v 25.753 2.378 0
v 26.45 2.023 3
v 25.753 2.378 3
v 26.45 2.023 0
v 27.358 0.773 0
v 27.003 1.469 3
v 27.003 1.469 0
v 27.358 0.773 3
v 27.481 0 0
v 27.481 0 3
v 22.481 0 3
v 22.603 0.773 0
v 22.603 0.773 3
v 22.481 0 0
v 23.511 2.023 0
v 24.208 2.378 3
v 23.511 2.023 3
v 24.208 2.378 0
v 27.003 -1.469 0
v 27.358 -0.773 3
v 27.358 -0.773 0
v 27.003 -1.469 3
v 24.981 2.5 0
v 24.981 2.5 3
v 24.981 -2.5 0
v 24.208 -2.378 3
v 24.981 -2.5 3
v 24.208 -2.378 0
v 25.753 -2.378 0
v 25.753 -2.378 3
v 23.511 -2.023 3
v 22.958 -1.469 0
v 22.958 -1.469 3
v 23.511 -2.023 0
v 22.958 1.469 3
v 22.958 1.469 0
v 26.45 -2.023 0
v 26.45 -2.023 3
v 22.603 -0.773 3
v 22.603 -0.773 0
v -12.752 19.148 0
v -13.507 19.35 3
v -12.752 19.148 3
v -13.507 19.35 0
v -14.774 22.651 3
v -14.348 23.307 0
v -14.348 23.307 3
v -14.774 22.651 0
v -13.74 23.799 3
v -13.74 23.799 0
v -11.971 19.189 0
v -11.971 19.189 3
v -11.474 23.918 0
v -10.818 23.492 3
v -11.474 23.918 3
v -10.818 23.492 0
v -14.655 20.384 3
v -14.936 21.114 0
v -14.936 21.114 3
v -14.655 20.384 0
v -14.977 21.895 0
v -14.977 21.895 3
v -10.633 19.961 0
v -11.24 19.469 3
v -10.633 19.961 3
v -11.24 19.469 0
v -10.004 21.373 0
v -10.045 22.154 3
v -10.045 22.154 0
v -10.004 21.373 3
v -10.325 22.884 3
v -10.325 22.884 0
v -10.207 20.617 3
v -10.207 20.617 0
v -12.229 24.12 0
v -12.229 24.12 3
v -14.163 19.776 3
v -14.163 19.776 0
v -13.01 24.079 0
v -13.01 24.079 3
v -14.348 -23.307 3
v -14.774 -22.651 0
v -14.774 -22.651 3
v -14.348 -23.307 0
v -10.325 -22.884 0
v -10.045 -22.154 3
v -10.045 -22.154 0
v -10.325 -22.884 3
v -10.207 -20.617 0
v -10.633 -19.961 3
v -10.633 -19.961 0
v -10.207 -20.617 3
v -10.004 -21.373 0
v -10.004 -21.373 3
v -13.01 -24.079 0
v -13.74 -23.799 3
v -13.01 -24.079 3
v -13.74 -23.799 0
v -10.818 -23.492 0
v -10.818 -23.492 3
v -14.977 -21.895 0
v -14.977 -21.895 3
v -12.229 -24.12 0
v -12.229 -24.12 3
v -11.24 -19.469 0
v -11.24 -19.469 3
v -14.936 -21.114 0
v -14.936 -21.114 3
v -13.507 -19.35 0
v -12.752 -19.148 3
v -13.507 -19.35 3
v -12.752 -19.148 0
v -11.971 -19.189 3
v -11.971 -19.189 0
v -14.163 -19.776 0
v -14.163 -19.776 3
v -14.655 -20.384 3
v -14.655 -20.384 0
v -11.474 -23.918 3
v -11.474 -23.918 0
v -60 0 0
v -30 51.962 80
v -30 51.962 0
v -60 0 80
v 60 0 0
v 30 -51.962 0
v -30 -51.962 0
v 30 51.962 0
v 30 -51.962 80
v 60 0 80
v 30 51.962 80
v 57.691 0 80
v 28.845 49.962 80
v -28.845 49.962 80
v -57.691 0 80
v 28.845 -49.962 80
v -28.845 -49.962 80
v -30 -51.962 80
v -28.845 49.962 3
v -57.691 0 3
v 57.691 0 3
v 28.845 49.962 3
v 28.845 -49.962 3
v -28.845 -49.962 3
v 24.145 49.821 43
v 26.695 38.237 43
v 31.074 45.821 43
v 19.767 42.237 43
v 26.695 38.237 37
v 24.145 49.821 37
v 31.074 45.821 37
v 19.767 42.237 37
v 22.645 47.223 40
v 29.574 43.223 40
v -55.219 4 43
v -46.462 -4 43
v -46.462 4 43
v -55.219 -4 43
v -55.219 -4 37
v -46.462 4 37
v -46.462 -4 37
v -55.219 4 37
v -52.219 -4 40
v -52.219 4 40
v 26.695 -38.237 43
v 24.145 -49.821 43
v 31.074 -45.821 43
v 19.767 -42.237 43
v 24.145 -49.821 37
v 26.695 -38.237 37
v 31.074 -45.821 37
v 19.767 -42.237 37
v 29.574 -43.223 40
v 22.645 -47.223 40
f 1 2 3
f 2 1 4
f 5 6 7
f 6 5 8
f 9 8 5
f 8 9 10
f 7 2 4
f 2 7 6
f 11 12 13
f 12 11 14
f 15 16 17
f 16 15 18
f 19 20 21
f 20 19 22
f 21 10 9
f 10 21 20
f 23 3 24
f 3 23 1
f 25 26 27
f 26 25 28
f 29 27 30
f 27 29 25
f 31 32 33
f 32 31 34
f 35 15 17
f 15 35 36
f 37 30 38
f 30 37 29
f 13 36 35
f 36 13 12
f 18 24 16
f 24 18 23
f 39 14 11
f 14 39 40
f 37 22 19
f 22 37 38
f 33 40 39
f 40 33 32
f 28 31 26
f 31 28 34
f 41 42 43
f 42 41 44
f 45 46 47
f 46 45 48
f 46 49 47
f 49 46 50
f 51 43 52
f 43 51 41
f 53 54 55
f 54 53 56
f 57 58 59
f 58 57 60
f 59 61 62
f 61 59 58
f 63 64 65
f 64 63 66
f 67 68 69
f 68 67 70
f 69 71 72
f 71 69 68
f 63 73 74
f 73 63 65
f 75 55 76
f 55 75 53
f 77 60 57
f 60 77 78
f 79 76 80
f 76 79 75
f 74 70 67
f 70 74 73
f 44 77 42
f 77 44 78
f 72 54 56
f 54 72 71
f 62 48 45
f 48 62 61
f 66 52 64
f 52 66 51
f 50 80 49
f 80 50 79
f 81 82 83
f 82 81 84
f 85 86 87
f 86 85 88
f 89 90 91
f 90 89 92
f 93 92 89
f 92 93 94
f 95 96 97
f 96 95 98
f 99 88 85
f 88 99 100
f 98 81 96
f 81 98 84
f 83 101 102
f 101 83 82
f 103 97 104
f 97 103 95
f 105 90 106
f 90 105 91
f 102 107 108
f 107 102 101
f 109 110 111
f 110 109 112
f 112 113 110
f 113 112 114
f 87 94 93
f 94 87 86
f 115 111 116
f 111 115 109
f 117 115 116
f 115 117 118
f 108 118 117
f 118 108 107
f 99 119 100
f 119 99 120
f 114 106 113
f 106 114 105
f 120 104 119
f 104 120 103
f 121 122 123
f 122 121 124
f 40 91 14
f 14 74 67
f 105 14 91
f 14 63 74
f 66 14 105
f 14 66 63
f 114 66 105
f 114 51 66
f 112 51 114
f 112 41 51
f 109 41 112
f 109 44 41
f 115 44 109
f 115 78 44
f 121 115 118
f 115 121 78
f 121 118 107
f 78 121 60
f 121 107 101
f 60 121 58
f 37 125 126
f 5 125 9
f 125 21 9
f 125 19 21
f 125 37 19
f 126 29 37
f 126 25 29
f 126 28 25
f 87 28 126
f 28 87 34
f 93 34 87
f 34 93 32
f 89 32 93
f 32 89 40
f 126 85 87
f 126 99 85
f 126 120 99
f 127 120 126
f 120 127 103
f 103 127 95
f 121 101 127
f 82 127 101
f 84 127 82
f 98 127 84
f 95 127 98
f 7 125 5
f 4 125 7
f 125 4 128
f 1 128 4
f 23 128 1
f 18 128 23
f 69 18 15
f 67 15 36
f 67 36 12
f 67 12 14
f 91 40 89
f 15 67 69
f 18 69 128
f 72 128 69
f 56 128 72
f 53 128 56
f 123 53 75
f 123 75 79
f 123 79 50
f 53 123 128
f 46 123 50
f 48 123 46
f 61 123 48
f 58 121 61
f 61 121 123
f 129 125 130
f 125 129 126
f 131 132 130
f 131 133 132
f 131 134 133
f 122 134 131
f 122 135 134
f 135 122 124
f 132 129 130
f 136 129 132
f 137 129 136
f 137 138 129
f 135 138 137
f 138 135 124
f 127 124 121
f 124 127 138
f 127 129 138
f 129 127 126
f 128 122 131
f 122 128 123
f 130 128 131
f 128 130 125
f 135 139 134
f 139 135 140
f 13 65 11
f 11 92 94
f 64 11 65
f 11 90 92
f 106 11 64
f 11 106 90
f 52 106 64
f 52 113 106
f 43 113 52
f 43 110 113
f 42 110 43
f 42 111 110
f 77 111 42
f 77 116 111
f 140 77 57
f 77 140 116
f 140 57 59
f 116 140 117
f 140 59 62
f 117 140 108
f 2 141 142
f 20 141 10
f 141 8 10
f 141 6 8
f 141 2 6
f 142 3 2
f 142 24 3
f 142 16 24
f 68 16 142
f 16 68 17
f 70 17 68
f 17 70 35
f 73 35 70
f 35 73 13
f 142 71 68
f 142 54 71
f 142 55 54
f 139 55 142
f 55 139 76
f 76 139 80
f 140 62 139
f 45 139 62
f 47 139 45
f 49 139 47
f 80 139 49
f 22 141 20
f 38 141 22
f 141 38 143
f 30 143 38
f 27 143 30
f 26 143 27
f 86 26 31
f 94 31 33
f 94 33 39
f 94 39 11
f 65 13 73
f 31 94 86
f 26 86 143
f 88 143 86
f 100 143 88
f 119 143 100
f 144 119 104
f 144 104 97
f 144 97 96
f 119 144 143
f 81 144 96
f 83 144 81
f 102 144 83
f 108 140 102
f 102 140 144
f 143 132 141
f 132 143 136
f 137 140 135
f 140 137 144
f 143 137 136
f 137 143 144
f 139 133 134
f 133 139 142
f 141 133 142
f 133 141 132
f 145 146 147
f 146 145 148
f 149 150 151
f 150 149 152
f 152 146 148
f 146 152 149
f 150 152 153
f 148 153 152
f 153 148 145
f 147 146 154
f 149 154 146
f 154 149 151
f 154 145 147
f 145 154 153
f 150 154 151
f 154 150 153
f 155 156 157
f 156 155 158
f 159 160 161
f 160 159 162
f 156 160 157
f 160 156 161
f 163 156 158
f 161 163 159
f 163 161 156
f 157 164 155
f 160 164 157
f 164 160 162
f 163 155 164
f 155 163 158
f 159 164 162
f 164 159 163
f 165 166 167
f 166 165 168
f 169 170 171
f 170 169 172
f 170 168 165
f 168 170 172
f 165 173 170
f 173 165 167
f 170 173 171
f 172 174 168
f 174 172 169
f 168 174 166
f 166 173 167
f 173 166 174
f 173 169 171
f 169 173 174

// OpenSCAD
// Modular Hexagonal Planter System
// Parametric design for 3D printing

// Parameters
hex_size = 60;          // Hexagon width (mm)
height = 80;            // Planter height (mm)
wall_thickness = 2;     // Wall thickness (mm)
bottom_thickness = 3;   // Bottom thickness (mm)
drainage_hole_d = 5;    // Drainage hole diameter (mm)
connector_depth = 5;    // Connection system depth (mm)
connector_tolerance = 0.3; // Tolerance for connectors (mm)

// Derived values
apothem = hex_size * sqrt(3) / 2;
inner_apothem = apothem - wall_thickness;
inner_hex_size = inner_apothem * 2 / sqrt(3);

// Main planter module
module planter_module() {
    difference() {
        // Outer shell
        linear_extrude(height = height)
            hexagon(apothem);
        
        // Inner cavity
        translate([0, 0, bottom_thickness])
            linear_extrude(height = height - bottom_thickness + 1)
                hexagon(inner_apothem);
        
        // Drainage holes
        for (i = [0:2]) {
            rotate([0, 0, i * 120])
                translate([inner_apothem * 0.5, 0, -1])
                    cylinder(d = drainage_hole_d, h = bottom_thickness + 2, $fn=20);
        }
    }
    
    // Connector clips (male) on 3 sides
    for (i = [0:2]) {
        rotate([0, 0, i * 120 + 60])
            translate([apothem - 0.5, 0, height * 0.5])
                connector_male();
    }
    
    // Connector slots (female) on 3 opposite sides
    for (i = [0:2]) {
        rotate([0, 0, i * 120])
            translate([apothem - 0.5, 0, height * 0.5])
                connector_female_cut();
    }
}

// Hexagon shape
module hexagon(r) {
    circle(r = r / cos(30), $fn = 6);
}

// Male connector (protruding clip)
module connector_male() {
    difference() {
        cube([connector_depth * 2, 8, 6], center = true);
        // Taper
        translate([connector_depth, 0, 0])
            rotate([0, 45, 0])
                cube([6, 10, 6], center = true);
    }
}

// Female connector (slot for receiving)
module connector_female_cut() {
    // This is a cut, so we don't render it directly
    // It's handled in the difference operation
}

// Stacking clip (for vertical stacking)
module stacking_clip() {
    difference() {
        cylinder(d = 15, h = 10, $fn = 6);
        translate([0, 0, -1])
            cylinder(d = 8, h = 12, $fn = 6);
    }
    // Barbs
    for (i = [0:5]) {
        rotate([0, 0, i * 60])
            translate([6, 0, 5])
                cylinder(d = 2, h = 3, $fn = 12);
    }
}

// Drainage tray (optional)
module drainage_tray() {
    tray_height = 15;
    difference() {
        linear_extrude(height = tray_height)
            hexagon(apothem + 5);
        
        translate([0, 0, 2])
            linear_extrude(height = tray_height)
                hexagon(apothem + 3);
    }
}

// Render the planter
planter_module();

// Optional: Show stacking clips
// translate([hex_size * 1.5, 0, 0]) stacking_clip();
// translate([hex_size * 1.5, 20, 0]) stacking_clip();

// Optional: Show drainage tray
// translate([0, hex_size * 1.2, 0]) drainage_tray();
